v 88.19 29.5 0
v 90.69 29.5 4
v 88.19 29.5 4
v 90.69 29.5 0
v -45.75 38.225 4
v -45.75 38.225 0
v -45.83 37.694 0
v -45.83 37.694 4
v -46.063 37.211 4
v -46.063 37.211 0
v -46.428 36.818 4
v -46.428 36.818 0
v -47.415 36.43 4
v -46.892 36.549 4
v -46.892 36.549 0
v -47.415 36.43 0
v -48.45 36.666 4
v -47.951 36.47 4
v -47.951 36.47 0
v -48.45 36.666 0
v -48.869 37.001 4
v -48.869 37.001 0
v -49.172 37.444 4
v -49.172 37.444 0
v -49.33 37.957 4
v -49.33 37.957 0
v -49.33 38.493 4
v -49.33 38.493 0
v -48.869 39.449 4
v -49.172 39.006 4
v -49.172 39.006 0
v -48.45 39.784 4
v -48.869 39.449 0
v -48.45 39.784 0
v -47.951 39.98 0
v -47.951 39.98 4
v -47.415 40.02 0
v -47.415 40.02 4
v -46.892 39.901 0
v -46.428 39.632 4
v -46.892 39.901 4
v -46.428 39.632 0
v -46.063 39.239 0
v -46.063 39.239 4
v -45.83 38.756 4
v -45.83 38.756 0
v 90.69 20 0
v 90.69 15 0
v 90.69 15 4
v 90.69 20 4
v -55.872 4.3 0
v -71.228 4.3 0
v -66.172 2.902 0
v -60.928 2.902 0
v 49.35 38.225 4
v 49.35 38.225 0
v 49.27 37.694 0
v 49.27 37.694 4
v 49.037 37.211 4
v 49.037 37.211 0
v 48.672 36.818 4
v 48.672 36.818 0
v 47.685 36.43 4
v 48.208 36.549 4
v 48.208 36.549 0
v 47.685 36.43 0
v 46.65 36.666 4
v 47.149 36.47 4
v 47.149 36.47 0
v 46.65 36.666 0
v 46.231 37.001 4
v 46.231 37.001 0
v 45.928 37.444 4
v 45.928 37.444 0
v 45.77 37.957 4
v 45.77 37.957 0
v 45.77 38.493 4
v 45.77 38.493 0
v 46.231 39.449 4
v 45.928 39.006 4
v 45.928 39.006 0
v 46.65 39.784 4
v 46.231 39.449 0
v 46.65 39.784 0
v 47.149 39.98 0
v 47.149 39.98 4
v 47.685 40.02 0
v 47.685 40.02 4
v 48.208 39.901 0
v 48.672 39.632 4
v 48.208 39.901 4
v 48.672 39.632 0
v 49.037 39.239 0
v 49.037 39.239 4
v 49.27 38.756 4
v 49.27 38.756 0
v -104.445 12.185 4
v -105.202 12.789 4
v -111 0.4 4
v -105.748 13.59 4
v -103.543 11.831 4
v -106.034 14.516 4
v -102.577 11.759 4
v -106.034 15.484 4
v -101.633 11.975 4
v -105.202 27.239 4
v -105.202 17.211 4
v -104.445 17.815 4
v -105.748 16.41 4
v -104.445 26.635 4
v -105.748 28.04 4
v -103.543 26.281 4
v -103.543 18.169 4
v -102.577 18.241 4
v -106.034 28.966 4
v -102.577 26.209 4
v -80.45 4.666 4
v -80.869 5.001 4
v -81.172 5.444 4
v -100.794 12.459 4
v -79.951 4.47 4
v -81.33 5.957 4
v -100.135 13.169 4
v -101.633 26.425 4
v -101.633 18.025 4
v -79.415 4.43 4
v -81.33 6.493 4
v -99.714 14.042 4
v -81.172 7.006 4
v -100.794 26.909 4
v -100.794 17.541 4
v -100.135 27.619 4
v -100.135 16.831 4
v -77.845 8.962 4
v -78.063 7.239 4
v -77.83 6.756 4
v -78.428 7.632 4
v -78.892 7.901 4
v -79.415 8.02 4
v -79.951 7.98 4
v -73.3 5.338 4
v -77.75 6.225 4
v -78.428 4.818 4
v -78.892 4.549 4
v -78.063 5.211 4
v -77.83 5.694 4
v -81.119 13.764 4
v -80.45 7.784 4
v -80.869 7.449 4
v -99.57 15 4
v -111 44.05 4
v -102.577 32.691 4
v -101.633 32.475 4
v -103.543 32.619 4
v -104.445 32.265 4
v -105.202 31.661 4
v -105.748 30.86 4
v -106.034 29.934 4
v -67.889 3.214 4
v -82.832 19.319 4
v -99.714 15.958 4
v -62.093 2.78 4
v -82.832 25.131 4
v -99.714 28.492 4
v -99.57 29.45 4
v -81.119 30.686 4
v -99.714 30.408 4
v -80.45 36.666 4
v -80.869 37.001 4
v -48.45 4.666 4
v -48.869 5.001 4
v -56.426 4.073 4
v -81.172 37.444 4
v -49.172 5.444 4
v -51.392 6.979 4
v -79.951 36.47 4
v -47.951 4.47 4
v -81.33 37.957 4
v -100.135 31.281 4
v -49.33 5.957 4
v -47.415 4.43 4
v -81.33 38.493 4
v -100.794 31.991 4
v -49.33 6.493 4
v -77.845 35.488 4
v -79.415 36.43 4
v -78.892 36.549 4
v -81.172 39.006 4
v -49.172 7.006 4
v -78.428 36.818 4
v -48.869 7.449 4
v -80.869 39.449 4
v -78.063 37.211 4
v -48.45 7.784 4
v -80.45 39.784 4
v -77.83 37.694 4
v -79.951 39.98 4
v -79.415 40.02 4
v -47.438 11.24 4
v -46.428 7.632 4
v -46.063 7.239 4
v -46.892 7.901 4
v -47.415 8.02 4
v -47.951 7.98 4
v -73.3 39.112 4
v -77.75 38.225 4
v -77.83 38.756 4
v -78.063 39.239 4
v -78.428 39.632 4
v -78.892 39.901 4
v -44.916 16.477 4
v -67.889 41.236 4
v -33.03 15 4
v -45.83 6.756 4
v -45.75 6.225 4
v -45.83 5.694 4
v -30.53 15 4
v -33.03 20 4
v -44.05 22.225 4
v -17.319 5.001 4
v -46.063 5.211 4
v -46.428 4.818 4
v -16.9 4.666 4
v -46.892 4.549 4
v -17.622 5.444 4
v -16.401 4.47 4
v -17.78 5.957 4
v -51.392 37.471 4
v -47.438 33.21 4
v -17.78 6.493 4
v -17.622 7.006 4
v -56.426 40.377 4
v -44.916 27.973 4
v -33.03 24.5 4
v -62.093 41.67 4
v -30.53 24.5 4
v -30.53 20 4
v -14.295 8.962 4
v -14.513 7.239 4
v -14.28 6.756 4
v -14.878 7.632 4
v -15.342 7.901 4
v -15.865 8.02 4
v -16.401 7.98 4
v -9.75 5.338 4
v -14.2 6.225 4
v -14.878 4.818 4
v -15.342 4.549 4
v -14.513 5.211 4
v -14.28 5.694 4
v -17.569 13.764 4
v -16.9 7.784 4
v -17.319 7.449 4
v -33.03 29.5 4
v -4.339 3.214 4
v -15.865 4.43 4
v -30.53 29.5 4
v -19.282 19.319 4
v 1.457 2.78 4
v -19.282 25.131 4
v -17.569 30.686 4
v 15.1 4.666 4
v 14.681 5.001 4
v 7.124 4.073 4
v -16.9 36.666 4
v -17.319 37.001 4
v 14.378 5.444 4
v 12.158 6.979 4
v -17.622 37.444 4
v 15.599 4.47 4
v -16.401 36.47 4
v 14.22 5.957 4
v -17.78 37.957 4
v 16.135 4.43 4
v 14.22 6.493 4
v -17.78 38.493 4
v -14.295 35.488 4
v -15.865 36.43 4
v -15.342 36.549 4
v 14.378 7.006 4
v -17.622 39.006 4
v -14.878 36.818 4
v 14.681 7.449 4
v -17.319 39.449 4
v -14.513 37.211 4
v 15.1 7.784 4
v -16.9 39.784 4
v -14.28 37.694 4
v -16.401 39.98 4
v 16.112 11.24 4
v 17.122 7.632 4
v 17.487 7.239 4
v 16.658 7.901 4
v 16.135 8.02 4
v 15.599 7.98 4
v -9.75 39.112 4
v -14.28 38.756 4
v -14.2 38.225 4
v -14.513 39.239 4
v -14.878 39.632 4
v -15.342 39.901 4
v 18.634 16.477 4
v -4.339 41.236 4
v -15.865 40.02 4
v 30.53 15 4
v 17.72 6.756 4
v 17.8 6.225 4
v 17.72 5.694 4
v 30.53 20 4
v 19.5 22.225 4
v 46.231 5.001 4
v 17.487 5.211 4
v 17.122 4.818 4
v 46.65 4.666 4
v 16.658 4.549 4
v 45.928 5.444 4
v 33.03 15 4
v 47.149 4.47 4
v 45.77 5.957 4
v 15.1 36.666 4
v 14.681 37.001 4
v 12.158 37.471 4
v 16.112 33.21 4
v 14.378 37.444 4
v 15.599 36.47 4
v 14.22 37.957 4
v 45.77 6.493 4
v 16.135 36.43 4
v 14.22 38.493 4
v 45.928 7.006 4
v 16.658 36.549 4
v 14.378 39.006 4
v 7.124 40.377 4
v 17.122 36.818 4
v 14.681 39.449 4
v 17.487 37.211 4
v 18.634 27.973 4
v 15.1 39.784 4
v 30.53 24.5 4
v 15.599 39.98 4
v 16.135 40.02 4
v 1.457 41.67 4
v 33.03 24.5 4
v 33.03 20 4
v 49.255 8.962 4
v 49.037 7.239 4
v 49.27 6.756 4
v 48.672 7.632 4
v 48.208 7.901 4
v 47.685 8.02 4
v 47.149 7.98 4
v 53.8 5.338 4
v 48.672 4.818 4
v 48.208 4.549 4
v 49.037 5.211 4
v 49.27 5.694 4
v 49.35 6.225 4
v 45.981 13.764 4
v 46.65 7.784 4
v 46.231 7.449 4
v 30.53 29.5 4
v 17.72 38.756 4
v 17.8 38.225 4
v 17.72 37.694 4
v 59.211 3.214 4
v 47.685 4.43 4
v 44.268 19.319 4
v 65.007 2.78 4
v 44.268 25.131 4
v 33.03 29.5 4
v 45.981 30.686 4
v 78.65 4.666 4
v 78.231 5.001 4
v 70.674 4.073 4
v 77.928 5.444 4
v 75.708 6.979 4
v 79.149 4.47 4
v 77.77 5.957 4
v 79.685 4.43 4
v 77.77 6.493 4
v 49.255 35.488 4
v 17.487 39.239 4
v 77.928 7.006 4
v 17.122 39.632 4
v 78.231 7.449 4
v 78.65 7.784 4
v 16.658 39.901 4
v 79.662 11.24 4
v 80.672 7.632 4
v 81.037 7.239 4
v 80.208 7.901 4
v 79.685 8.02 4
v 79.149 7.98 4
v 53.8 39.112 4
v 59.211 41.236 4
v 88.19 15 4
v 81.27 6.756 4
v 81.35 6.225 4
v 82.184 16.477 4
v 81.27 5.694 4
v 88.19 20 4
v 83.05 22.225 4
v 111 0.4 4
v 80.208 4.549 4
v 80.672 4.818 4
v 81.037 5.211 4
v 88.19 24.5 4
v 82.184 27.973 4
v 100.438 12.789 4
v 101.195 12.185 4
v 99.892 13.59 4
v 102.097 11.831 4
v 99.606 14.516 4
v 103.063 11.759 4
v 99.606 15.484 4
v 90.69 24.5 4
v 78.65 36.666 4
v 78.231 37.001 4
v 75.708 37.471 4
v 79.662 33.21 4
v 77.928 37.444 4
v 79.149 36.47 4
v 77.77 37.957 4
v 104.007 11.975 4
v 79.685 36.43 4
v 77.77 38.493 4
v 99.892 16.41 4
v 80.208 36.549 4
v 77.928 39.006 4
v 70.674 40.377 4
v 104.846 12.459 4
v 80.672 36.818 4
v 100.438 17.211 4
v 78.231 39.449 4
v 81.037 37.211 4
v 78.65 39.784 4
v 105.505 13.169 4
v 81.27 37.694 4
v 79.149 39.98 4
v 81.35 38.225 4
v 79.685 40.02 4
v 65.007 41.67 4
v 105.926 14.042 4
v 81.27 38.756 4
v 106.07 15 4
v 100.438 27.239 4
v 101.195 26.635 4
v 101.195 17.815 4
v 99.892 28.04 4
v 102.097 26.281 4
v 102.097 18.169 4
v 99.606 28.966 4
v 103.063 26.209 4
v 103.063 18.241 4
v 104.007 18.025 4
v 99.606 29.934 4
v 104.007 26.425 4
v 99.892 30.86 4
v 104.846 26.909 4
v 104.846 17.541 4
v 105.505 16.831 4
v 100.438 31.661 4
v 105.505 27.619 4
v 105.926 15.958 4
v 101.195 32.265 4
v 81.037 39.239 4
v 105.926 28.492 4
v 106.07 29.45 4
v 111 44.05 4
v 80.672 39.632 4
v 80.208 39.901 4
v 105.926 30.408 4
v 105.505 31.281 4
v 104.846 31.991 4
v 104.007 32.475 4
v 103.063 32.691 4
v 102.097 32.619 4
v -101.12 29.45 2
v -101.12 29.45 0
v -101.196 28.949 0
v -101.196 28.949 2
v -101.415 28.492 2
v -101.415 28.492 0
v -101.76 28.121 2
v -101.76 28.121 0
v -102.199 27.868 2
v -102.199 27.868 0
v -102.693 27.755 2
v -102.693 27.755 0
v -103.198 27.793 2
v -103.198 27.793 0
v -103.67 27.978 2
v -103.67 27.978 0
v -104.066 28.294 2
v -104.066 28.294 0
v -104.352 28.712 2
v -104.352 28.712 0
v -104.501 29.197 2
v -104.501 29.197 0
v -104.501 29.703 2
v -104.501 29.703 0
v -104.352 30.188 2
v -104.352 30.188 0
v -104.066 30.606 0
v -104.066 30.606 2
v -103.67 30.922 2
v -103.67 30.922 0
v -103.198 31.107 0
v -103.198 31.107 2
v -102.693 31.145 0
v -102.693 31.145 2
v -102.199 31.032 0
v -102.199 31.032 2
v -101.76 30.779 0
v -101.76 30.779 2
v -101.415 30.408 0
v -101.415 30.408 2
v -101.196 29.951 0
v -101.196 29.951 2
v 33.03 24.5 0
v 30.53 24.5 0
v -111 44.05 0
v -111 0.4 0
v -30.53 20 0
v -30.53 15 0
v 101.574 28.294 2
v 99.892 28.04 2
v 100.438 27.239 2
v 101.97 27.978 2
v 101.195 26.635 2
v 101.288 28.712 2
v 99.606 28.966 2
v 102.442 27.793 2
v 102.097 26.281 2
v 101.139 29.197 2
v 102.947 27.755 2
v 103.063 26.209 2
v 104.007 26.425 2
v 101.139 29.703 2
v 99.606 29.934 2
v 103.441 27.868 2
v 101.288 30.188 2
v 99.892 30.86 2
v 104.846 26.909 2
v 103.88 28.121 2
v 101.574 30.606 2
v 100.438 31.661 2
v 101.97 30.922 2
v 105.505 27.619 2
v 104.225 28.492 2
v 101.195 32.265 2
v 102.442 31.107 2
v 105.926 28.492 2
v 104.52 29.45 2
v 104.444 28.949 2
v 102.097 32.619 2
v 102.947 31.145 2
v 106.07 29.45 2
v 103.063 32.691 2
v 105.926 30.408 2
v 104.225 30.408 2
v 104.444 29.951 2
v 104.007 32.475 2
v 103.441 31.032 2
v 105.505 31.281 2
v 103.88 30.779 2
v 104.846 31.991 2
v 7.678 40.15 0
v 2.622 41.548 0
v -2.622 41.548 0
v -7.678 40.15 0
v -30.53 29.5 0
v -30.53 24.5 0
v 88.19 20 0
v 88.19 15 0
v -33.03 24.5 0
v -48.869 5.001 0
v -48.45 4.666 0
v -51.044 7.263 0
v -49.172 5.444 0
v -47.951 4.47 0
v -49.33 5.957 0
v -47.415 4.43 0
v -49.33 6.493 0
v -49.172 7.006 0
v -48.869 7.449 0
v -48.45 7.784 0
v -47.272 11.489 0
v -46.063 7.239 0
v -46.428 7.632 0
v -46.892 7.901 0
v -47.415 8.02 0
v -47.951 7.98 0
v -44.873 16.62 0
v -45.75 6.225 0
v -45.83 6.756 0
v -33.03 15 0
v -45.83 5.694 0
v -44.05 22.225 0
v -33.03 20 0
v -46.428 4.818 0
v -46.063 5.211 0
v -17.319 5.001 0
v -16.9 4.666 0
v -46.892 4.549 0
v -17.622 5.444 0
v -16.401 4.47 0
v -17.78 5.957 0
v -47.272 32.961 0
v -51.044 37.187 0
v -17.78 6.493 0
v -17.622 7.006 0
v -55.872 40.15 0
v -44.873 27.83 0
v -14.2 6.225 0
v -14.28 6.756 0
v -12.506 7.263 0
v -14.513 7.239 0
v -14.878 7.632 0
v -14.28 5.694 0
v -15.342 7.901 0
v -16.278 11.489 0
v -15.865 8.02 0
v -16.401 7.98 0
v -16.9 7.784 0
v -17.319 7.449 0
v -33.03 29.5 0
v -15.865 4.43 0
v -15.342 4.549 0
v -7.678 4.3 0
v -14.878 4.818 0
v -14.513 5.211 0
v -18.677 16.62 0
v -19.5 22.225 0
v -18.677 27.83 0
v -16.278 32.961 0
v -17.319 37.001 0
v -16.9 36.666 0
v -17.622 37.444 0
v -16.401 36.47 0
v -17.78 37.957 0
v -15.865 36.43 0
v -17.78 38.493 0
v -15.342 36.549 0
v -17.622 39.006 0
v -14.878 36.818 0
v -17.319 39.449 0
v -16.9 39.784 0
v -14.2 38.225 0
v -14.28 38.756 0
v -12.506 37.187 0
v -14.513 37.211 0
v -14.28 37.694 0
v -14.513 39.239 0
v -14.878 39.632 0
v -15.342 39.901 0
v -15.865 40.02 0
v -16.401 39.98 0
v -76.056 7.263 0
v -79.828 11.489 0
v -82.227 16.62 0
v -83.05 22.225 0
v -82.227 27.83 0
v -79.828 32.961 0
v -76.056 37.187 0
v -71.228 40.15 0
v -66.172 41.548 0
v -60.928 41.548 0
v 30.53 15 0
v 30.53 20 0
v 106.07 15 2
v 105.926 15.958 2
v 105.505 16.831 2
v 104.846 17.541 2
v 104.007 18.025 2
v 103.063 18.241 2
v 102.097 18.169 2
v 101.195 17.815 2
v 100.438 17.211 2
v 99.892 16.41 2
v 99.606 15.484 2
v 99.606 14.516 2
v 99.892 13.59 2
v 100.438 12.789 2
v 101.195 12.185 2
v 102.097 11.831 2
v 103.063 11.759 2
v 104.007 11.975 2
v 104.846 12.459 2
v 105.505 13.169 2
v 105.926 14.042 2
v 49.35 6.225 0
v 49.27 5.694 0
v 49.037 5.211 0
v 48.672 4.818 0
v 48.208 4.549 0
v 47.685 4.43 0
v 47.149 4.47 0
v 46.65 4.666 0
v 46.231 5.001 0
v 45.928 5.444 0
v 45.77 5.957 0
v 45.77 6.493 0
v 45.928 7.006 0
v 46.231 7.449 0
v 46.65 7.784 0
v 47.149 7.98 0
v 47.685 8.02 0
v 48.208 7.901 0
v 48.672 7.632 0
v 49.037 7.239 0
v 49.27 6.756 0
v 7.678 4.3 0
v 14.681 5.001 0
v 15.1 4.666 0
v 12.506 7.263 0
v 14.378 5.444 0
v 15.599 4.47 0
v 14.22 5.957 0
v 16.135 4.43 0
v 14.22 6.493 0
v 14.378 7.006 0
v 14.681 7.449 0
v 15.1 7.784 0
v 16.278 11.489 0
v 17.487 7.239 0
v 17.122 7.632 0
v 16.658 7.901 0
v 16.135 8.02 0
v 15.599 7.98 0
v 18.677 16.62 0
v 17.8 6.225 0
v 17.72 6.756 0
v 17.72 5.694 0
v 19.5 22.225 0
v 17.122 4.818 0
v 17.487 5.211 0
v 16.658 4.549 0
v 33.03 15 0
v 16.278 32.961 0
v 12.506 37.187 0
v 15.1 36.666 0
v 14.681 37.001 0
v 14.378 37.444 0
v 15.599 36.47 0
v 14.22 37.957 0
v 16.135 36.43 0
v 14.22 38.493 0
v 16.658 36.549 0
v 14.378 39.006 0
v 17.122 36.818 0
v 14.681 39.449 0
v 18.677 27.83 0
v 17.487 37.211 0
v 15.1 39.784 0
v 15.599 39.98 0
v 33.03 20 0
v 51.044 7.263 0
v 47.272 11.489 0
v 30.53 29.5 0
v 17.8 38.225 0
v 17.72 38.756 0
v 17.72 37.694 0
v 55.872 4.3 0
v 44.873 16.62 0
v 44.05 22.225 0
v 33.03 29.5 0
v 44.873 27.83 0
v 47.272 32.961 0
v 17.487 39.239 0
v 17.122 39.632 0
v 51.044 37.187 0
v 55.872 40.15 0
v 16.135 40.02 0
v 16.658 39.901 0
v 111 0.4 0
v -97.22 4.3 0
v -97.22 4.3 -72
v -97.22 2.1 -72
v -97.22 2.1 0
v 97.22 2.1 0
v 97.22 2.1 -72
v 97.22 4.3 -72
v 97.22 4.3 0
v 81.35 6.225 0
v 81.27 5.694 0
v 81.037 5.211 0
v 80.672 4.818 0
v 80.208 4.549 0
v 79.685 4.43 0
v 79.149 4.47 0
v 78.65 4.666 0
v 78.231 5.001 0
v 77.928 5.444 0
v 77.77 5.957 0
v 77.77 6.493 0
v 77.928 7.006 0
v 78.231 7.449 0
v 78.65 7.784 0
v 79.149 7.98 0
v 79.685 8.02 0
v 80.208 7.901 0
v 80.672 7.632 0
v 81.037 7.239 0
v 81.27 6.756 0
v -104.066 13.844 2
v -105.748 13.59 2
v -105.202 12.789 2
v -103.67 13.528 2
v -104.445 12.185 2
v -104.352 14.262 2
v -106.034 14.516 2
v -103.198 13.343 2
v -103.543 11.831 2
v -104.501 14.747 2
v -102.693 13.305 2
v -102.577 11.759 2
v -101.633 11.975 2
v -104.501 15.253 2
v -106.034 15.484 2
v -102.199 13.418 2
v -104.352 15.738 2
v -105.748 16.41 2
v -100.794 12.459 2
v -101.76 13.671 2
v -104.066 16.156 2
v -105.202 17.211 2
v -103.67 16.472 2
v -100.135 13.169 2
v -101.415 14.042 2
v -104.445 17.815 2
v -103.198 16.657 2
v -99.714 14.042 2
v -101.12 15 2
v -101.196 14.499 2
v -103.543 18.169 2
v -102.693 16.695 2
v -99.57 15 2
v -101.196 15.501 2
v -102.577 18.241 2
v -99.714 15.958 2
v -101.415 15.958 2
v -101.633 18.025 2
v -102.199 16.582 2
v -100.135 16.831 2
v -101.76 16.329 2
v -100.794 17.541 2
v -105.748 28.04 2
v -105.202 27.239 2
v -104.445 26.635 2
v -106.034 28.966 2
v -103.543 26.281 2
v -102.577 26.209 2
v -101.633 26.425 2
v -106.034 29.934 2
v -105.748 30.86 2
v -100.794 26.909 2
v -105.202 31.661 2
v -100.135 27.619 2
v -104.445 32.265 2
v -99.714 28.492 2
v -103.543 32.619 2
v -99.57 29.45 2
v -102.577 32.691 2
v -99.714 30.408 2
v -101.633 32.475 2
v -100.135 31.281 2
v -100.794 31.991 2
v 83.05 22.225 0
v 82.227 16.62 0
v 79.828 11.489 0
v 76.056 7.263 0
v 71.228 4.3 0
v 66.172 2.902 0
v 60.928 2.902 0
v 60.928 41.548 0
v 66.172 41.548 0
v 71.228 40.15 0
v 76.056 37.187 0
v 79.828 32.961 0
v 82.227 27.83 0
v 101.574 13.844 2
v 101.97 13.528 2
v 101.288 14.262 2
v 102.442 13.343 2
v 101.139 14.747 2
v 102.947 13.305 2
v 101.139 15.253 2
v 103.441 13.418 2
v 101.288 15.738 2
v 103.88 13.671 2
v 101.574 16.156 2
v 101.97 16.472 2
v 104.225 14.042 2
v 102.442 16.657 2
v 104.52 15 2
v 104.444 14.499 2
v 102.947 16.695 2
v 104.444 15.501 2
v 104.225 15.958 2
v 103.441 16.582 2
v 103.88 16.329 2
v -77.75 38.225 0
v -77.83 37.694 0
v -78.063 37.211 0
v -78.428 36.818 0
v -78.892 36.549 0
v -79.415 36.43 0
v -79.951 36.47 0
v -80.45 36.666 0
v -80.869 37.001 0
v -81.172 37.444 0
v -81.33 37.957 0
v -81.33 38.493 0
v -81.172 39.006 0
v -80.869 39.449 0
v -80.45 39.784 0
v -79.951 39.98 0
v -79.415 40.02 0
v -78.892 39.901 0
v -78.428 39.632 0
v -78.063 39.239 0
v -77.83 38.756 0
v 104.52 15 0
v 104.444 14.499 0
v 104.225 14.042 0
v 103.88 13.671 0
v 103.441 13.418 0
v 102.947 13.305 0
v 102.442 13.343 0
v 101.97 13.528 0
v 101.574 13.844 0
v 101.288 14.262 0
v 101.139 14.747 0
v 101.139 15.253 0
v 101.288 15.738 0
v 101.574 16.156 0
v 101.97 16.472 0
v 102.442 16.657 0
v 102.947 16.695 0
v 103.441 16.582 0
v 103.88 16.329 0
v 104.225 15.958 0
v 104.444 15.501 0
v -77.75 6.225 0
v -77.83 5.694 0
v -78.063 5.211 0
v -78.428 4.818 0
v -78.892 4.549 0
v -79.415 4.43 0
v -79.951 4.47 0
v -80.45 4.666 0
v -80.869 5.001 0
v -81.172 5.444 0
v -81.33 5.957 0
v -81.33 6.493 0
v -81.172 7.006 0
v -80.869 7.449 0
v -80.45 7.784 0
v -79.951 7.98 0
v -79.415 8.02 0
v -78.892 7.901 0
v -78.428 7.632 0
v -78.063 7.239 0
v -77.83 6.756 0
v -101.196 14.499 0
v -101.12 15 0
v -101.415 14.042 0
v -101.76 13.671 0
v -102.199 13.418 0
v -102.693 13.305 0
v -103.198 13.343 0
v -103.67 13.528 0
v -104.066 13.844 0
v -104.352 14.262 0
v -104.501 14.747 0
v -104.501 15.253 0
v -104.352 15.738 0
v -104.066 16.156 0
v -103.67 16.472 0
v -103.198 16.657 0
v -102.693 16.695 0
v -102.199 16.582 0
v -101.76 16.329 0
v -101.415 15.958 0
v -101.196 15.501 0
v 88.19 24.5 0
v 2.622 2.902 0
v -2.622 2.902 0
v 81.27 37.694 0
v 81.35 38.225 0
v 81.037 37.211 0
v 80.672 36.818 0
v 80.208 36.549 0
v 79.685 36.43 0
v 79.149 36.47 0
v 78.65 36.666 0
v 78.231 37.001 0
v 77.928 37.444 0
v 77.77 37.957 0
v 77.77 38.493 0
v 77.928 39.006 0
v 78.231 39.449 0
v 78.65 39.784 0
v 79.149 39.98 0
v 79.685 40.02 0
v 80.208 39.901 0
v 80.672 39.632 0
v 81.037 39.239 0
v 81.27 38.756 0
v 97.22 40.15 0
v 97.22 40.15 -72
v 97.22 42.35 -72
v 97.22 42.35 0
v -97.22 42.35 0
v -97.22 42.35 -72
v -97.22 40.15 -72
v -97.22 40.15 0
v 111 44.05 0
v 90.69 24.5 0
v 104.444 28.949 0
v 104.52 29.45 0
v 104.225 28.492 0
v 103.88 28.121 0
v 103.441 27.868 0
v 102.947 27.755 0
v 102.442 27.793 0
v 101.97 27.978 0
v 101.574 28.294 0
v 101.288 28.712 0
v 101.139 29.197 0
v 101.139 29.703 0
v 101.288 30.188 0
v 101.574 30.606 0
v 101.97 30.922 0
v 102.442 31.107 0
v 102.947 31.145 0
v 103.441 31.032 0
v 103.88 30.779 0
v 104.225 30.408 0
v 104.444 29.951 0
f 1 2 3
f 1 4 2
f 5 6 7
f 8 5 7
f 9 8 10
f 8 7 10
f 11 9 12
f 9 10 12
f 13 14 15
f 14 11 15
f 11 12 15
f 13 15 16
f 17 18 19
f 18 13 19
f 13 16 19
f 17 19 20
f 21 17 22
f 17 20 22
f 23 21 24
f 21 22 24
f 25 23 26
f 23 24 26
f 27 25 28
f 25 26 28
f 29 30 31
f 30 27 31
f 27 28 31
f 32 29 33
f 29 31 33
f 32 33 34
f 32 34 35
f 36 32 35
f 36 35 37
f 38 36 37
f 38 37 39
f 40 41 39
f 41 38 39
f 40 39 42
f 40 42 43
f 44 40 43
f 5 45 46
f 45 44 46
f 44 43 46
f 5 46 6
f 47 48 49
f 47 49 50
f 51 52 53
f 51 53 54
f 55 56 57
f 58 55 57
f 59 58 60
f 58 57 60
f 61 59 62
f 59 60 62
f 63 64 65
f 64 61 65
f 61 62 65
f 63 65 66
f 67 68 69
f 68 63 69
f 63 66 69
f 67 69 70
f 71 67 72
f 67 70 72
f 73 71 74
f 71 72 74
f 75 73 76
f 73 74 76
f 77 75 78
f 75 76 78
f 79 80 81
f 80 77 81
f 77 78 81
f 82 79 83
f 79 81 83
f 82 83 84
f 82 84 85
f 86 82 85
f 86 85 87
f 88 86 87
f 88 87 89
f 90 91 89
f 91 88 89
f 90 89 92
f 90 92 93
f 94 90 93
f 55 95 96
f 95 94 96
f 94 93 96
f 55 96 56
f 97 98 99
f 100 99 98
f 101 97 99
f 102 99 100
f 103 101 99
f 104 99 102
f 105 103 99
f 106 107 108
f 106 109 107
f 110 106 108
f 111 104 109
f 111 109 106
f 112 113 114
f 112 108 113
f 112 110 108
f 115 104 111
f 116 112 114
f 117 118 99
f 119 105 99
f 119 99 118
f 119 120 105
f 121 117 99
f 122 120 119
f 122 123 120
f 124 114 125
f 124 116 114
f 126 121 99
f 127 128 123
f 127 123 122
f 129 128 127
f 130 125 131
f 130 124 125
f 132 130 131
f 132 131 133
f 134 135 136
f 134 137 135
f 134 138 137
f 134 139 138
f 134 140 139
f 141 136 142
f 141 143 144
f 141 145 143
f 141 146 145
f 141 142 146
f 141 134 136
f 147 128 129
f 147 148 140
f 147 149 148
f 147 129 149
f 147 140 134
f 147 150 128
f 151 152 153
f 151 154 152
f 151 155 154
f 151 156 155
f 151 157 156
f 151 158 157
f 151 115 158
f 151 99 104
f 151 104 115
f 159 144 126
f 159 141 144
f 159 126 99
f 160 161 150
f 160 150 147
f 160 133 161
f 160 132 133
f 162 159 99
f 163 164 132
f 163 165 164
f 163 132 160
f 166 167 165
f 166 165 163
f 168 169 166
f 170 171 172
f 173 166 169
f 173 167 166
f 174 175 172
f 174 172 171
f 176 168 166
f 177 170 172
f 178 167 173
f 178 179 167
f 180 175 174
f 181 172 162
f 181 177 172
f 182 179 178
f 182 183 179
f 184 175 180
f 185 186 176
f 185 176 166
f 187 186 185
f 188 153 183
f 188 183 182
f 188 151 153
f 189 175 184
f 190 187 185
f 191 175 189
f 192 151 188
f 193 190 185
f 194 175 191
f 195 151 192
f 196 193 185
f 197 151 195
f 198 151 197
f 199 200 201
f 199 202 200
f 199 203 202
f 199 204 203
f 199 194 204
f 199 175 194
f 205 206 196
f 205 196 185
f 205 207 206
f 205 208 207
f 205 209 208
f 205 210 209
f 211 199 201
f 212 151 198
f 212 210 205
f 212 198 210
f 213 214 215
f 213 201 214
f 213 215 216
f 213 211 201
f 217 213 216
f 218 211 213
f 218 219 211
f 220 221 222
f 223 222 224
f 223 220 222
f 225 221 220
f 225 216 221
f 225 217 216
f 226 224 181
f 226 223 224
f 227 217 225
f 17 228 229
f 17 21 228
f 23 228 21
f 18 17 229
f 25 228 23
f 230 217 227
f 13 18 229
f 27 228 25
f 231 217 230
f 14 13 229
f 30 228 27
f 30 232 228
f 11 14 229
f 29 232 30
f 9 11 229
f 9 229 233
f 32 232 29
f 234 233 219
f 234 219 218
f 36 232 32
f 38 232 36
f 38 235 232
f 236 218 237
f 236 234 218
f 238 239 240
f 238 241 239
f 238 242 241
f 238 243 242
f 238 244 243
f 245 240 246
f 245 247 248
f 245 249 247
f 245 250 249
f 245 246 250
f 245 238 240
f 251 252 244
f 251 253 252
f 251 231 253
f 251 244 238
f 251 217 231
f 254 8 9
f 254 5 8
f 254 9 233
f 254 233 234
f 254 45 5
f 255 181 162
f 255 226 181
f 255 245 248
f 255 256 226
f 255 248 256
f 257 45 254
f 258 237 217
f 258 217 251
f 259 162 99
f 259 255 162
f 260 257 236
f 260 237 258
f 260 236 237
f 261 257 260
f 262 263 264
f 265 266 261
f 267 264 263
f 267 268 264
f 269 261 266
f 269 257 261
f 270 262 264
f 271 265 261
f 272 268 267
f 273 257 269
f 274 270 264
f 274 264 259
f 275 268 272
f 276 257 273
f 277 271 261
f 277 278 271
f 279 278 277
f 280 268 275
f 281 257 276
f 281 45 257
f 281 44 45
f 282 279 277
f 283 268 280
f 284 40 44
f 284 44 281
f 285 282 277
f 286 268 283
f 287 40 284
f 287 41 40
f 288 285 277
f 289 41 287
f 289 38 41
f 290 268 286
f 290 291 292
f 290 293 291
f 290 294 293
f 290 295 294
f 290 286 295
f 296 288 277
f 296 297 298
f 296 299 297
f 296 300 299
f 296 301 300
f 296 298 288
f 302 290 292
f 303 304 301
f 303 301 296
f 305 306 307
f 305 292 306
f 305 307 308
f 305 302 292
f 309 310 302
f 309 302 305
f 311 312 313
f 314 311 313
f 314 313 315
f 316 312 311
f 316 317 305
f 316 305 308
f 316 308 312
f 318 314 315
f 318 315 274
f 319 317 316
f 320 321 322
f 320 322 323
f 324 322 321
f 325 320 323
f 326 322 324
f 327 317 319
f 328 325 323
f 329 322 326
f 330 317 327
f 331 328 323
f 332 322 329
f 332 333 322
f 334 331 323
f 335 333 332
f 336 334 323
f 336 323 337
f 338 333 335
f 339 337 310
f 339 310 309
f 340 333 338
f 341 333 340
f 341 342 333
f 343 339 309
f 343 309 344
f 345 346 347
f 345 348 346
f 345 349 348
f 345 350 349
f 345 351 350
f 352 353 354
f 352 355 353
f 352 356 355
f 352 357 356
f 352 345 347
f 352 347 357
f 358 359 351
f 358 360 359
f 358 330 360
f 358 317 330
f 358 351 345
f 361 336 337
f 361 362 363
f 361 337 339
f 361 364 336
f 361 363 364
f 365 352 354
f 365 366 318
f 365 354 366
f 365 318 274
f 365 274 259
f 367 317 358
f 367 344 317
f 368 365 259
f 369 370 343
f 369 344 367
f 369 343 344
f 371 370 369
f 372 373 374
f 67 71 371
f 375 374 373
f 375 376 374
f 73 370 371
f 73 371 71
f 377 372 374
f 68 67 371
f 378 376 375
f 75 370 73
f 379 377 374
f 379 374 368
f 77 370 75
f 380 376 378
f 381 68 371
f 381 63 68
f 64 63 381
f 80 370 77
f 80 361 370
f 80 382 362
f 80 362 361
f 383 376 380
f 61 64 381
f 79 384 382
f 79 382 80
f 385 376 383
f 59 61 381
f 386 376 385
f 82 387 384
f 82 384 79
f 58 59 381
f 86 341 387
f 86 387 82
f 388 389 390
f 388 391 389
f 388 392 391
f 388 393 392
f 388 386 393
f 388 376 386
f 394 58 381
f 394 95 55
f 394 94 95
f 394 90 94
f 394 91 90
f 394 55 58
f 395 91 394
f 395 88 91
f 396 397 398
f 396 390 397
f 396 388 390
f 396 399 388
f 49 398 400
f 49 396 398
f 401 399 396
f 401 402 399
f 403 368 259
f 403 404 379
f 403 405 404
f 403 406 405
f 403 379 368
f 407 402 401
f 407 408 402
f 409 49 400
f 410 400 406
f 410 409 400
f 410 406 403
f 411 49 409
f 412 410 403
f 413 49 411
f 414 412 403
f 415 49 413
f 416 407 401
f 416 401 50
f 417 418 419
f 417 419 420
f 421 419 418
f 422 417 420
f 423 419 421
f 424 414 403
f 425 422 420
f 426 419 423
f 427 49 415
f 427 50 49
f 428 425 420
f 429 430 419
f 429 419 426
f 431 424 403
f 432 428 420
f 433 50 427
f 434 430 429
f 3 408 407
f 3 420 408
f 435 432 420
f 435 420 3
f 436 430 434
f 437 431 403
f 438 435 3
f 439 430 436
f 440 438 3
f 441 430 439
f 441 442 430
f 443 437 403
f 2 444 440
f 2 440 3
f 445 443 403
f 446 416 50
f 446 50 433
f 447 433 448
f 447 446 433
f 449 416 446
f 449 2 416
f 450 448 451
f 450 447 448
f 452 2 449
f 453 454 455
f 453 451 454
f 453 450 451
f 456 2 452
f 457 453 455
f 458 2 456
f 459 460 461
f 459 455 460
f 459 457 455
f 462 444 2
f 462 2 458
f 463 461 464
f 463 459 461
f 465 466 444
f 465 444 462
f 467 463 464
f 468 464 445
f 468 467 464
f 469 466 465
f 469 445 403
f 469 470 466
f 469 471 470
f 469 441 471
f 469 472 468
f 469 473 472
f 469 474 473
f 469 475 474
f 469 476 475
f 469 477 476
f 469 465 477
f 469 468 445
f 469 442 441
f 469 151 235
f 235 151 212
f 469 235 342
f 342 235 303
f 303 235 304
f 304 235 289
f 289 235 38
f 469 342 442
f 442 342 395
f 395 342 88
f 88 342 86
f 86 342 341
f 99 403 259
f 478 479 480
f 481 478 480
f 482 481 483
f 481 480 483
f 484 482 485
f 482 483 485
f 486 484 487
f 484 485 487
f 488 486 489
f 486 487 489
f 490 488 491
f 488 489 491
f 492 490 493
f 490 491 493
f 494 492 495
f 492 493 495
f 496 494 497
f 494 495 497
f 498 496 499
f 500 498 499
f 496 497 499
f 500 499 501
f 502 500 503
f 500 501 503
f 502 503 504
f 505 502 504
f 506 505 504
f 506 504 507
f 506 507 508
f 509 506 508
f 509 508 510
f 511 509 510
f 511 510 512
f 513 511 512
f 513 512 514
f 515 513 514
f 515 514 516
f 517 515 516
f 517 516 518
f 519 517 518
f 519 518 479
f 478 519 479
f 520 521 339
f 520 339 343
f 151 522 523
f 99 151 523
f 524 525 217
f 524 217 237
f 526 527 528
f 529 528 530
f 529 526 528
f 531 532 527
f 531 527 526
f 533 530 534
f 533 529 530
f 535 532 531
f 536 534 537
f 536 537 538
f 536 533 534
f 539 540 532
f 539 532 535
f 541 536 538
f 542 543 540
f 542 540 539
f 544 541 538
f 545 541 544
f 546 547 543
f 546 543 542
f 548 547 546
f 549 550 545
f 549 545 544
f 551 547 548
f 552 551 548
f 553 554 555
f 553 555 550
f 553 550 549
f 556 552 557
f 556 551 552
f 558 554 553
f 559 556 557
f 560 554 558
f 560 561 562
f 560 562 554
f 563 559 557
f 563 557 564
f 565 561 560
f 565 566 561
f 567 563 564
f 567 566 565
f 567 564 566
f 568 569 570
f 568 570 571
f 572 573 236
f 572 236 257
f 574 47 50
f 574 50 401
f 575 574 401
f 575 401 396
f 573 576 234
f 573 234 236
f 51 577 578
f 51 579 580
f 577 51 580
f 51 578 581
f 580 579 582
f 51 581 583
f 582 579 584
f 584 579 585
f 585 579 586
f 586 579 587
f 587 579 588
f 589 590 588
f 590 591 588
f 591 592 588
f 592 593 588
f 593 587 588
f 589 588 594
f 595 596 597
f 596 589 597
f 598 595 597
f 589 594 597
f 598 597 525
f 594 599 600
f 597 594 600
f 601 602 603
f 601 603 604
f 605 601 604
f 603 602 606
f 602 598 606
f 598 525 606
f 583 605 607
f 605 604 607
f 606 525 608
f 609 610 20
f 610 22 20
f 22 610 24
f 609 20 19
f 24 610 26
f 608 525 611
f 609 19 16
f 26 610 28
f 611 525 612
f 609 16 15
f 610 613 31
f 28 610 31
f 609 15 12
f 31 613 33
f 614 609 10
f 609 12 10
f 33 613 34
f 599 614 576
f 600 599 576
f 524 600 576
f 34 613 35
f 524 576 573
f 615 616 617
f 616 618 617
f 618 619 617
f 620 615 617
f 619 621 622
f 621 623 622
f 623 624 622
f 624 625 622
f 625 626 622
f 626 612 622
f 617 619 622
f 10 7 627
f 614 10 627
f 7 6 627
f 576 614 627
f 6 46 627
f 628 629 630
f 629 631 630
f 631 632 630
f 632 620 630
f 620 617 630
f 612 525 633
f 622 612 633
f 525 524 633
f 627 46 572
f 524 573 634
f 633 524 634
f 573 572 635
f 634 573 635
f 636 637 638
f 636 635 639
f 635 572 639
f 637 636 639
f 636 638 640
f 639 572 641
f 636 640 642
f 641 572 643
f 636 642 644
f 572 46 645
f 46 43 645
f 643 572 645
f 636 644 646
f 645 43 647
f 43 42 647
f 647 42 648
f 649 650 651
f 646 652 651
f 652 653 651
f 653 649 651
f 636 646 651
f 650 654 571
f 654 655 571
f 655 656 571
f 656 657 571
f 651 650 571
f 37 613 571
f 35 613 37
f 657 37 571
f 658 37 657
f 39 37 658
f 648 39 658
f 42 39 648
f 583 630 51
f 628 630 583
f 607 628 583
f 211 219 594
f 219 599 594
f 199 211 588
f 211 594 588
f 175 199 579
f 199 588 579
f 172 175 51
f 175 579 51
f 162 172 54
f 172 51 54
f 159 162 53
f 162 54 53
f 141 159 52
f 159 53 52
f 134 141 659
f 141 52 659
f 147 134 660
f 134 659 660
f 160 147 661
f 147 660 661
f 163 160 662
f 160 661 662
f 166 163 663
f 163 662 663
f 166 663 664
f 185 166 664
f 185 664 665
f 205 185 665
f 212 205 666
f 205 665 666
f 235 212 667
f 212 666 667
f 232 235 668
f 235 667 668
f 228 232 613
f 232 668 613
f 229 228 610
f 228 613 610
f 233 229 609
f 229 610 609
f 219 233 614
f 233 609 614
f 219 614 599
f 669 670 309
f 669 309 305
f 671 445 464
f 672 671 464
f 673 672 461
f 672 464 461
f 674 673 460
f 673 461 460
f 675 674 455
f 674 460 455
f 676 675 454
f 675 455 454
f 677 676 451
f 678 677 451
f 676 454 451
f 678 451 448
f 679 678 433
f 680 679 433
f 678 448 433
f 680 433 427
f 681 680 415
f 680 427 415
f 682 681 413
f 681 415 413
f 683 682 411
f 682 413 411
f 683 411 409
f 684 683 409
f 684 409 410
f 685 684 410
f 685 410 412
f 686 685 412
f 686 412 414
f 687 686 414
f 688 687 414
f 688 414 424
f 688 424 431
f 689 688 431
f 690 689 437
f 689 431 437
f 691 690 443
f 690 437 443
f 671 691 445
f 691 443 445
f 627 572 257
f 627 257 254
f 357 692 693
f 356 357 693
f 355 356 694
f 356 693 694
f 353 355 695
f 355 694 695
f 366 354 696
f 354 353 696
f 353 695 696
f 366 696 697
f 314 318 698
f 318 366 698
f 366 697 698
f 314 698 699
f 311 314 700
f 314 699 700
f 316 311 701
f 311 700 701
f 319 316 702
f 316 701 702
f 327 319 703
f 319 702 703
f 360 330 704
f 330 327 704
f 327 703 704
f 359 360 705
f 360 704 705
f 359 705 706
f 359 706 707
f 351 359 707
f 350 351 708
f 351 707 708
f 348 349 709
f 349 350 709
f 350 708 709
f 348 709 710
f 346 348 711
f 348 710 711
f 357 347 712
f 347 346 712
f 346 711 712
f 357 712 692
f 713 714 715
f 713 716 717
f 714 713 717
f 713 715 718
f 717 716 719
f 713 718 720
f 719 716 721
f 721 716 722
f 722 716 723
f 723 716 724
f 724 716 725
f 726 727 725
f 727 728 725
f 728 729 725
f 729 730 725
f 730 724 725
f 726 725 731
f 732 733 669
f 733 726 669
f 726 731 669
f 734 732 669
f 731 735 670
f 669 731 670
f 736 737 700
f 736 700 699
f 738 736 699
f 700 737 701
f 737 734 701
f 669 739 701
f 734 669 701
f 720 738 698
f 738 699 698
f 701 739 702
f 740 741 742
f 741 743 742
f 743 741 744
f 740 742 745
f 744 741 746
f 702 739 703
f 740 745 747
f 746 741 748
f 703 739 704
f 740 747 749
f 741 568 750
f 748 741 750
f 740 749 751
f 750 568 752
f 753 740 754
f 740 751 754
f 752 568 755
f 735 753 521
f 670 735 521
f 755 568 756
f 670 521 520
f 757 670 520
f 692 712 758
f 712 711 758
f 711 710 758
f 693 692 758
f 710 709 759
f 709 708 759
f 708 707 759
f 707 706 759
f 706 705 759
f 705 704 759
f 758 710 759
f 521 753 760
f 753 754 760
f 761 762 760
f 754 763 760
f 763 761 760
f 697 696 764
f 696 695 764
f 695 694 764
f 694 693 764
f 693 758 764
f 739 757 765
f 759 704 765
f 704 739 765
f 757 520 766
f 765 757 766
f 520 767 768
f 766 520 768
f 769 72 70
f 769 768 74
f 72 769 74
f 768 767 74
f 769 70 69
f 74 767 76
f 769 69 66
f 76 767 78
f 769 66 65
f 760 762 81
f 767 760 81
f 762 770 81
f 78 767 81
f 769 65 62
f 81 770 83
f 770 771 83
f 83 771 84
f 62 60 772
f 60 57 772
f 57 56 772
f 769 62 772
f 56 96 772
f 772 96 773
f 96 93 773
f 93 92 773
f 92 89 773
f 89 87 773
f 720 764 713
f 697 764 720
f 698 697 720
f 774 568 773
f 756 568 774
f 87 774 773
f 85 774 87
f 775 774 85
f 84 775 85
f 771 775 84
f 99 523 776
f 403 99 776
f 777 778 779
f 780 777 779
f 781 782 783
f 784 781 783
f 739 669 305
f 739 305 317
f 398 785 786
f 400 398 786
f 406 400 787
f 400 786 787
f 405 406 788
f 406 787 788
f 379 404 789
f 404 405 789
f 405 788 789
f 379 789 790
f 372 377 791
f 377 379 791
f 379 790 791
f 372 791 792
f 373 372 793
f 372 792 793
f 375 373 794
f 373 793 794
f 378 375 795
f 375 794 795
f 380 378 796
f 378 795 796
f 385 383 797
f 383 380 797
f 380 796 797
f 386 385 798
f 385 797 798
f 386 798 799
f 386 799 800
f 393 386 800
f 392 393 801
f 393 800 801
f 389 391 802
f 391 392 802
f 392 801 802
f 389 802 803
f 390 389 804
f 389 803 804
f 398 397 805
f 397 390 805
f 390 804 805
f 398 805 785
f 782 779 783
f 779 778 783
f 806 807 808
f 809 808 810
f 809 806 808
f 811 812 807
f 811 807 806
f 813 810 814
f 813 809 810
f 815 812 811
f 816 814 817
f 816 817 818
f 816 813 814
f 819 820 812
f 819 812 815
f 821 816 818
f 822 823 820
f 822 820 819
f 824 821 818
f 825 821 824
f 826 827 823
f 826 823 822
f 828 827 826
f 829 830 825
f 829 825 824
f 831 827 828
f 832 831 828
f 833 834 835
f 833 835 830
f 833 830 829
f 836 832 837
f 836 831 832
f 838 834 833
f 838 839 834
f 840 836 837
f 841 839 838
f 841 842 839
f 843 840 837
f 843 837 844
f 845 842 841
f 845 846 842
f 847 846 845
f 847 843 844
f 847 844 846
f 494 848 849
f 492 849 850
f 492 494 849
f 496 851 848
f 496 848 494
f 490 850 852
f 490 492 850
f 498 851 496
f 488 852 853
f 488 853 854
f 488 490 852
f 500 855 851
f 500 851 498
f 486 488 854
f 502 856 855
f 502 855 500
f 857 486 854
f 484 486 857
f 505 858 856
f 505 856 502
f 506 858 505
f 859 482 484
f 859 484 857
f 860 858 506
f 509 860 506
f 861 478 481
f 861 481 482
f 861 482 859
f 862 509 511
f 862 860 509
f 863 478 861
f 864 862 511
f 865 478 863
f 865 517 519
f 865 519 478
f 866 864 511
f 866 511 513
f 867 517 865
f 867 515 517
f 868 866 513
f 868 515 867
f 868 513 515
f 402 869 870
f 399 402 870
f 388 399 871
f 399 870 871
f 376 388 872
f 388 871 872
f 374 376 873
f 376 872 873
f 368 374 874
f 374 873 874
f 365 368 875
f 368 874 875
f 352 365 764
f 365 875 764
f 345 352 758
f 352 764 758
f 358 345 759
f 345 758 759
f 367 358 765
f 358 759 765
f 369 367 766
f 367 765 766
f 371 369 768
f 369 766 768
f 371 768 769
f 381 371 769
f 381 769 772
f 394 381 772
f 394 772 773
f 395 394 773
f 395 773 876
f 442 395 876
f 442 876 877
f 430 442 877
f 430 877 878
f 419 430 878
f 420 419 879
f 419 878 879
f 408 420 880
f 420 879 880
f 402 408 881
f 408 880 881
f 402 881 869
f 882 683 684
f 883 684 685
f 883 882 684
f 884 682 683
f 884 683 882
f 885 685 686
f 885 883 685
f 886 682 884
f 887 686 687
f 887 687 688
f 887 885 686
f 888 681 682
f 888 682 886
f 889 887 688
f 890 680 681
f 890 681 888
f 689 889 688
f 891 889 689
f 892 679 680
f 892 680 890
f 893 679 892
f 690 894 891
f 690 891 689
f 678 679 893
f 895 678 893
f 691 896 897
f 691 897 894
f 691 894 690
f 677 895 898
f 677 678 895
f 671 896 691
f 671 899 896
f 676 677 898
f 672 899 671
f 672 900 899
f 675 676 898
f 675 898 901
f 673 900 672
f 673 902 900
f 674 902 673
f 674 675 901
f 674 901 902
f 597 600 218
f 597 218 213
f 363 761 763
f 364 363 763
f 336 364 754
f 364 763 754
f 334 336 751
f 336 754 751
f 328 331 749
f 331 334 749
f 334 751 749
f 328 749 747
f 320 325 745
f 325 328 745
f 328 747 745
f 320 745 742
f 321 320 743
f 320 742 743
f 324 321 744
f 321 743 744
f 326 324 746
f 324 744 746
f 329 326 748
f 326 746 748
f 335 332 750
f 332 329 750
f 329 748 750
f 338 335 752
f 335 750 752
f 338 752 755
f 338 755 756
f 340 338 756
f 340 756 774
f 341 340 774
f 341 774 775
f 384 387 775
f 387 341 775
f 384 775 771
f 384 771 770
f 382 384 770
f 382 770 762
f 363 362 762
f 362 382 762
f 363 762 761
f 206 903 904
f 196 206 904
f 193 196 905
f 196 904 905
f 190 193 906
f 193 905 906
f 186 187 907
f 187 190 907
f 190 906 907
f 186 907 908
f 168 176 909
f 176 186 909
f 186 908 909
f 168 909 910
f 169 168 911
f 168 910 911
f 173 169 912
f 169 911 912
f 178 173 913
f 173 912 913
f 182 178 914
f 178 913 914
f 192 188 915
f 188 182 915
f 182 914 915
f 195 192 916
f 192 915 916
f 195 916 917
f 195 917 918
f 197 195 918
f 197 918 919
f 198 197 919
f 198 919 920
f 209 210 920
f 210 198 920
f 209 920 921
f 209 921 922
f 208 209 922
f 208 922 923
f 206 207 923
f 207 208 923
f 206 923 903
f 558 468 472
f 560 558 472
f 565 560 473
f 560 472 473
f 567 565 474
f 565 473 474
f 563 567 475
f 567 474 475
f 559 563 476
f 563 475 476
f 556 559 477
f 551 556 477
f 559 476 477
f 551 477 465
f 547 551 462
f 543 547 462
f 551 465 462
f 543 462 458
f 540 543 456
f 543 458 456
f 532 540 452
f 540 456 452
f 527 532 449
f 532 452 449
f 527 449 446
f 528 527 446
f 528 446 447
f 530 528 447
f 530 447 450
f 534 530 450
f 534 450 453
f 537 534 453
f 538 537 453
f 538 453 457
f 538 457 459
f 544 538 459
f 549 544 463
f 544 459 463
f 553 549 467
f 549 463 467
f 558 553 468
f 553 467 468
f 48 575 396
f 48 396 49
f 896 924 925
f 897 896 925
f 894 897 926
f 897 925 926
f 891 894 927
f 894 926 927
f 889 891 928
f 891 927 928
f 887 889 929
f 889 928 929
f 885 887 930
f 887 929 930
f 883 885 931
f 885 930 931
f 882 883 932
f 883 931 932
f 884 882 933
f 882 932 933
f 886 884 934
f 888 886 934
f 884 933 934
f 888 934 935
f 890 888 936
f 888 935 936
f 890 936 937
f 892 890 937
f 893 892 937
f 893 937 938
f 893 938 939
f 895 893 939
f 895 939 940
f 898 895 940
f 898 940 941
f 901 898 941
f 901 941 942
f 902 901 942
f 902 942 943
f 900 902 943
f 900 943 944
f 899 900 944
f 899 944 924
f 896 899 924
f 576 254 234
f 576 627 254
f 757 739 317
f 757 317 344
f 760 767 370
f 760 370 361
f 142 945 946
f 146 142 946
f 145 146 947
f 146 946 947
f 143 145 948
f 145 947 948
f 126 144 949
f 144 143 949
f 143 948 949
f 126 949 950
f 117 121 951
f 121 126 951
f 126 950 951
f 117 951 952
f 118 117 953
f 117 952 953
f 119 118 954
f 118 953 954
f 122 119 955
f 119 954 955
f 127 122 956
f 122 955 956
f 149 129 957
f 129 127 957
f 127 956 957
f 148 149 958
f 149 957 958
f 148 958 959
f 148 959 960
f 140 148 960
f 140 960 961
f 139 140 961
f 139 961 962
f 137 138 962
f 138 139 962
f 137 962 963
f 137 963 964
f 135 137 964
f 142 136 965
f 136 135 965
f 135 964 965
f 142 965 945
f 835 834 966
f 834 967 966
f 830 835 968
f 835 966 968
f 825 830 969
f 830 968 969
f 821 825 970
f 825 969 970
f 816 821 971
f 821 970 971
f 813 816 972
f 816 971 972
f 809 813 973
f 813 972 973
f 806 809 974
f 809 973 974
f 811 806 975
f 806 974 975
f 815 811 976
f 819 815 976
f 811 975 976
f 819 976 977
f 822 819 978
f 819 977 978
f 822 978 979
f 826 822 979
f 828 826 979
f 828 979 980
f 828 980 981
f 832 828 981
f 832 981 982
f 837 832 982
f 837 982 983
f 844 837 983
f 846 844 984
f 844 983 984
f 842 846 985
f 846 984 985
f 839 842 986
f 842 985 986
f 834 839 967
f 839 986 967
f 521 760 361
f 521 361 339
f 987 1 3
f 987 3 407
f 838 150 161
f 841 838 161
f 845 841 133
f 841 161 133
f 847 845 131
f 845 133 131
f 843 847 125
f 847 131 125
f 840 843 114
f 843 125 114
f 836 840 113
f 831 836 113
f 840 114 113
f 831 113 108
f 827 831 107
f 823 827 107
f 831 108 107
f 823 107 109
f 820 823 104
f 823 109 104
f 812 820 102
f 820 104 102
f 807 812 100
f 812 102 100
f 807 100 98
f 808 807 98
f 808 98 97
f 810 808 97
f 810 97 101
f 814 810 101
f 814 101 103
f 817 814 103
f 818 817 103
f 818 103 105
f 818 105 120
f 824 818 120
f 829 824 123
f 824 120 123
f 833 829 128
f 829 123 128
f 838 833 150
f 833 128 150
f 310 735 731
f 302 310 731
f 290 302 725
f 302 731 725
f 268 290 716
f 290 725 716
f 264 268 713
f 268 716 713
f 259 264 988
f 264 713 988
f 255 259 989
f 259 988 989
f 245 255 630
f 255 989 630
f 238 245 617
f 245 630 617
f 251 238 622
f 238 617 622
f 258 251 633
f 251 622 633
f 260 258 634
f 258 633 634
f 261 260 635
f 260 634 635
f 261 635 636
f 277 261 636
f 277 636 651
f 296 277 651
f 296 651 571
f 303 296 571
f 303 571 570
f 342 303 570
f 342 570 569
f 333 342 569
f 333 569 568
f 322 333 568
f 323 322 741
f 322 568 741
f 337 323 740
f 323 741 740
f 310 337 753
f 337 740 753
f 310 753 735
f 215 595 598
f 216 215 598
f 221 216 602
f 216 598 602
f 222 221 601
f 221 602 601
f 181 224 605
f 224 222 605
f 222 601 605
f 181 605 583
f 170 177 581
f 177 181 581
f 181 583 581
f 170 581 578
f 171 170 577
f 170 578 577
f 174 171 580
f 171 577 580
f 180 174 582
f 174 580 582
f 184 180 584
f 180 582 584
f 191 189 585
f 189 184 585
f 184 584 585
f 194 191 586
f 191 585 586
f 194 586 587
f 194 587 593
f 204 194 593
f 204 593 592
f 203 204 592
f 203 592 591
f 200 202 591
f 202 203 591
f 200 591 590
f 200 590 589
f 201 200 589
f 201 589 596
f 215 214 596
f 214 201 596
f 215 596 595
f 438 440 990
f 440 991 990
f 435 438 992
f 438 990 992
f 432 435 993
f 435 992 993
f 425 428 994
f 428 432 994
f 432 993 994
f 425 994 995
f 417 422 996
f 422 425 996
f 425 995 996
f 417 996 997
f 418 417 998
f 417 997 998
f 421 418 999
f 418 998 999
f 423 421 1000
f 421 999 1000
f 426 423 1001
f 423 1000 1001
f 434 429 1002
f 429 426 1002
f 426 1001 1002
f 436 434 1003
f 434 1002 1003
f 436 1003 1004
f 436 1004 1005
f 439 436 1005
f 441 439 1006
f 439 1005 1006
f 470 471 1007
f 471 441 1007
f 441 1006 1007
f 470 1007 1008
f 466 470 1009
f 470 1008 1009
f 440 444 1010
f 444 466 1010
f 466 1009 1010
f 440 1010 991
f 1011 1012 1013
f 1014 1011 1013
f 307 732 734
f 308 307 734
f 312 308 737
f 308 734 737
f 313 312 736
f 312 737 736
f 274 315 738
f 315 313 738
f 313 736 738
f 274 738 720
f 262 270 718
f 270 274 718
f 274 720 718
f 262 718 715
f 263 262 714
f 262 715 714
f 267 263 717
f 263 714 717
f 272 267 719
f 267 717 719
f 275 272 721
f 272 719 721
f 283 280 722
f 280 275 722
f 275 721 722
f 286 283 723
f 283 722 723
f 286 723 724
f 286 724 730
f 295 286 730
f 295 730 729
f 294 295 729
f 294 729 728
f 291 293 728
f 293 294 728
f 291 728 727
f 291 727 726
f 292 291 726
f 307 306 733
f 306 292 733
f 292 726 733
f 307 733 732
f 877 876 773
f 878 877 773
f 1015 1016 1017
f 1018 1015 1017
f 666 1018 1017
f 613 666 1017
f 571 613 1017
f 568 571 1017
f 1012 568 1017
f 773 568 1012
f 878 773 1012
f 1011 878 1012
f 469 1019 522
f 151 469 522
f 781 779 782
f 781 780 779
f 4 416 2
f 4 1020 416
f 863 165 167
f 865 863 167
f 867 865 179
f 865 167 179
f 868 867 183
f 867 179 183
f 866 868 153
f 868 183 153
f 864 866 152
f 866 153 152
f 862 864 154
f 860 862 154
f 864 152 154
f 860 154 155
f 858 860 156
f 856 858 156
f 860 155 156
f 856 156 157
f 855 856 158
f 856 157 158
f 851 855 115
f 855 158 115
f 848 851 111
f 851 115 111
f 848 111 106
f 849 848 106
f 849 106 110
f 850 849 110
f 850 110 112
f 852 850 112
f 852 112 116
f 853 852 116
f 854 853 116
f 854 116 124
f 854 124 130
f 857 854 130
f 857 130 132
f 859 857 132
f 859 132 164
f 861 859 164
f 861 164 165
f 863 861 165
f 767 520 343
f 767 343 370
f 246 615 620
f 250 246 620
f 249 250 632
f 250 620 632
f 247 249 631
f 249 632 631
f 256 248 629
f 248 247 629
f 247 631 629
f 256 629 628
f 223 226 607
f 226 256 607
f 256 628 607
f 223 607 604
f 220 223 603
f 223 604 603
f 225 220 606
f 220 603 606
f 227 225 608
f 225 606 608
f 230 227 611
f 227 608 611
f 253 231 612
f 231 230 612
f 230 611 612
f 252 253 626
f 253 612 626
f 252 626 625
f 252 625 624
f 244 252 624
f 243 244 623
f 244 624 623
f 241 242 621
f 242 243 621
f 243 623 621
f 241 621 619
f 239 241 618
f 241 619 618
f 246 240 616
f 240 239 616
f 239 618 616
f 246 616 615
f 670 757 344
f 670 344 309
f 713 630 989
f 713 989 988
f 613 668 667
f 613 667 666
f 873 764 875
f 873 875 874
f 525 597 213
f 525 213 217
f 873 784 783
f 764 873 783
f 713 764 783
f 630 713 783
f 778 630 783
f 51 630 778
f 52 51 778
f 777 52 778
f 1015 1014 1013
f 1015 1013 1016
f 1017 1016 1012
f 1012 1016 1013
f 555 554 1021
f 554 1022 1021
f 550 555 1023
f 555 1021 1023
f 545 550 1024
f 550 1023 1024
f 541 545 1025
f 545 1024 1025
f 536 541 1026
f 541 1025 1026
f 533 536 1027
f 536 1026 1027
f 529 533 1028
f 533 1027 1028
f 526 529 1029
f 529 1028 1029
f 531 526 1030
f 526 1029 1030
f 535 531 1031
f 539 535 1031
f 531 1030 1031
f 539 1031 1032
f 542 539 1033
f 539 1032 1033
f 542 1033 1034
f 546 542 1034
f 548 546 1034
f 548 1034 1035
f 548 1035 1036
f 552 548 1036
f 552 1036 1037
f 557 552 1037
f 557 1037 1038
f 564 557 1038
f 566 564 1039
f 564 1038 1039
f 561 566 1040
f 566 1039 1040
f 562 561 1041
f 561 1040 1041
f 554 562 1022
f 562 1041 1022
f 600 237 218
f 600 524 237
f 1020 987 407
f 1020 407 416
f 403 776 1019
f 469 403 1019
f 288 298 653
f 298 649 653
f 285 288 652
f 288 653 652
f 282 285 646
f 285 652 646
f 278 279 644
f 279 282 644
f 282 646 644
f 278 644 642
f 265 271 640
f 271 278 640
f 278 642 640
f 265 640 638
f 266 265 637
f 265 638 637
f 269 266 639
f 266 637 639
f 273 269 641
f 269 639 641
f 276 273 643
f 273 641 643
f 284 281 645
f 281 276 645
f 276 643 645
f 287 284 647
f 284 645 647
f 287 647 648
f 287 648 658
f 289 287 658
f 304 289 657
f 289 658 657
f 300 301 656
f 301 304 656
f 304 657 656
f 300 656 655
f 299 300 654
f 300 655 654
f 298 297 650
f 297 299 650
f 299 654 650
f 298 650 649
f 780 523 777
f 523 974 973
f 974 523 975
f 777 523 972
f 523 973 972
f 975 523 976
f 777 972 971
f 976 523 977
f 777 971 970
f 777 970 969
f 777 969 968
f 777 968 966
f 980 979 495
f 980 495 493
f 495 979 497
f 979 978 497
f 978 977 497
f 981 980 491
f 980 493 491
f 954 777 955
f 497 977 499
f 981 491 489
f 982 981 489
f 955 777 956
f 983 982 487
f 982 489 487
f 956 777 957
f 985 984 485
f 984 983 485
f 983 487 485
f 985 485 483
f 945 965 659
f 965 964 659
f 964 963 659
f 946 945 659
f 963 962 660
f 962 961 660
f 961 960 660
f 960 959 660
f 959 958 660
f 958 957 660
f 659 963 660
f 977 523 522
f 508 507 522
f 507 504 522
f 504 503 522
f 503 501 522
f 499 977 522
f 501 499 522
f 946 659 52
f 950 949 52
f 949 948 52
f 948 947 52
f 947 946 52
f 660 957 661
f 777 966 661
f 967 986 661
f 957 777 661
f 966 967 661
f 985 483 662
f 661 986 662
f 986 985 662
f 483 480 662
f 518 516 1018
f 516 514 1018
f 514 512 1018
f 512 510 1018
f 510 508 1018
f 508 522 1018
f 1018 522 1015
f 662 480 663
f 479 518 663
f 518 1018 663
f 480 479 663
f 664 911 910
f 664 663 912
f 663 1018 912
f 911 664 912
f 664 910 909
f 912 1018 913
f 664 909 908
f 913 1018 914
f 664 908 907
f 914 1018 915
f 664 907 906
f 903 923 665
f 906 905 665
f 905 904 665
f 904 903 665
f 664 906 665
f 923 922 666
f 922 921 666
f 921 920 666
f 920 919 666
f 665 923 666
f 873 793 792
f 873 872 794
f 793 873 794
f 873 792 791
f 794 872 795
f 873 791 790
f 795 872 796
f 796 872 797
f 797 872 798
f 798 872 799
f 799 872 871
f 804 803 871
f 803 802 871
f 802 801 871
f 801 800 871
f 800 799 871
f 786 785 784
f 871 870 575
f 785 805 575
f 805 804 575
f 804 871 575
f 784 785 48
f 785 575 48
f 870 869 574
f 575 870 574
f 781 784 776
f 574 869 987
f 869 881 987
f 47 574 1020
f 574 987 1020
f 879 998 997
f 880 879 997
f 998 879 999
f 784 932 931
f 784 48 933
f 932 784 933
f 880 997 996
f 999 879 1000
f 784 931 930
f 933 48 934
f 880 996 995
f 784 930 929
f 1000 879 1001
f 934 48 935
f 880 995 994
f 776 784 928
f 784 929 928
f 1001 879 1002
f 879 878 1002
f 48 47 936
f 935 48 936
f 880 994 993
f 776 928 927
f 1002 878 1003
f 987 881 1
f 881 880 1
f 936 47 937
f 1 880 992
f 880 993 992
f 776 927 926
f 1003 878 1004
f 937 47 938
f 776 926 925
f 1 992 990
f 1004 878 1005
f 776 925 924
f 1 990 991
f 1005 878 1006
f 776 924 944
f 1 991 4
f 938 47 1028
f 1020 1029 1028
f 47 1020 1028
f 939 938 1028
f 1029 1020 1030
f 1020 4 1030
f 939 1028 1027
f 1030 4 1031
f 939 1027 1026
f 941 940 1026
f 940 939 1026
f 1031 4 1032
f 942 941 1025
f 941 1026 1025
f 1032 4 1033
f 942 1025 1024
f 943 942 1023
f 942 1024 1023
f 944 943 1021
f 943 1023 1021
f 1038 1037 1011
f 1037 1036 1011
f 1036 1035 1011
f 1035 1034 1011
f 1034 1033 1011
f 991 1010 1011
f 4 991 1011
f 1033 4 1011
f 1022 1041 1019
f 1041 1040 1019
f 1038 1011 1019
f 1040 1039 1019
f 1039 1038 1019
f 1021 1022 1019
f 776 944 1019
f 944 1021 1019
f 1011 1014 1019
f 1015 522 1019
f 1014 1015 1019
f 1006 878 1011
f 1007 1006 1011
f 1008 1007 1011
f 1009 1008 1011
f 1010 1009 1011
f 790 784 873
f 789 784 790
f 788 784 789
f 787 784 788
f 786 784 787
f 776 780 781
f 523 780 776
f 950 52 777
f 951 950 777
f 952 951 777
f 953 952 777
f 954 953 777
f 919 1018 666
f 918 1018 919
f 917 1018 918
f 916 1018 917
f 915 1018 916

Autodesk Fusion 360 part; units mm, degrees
sketch "Plate" plane through (0, 0, 0) normal (0, 0, 1) x (1, 0, 0)
  line L0 (-111, 0.4) -> (111, 0.4)
  line L1 (111, 0.4) -> (111, 44.05)
  line L2 (111, 44.05) -> (-111, 44.05)
  line L3 (-111, 44.05) -> (-111, 0.4)
extrude "Plate (1)" add sketch "Plate" along normal blind 4
sketch "Duct walls" plane through (0, 0, 0) normal (0, 0, 1) x (1, 0, 0)
  line L0 (-97.22, 2.1) -> (97.22, 2.1)
  line L1 (97.22, 2.1) -> (97.22, 4.3)
  line L2 (97.22, 4.3) -> (-97.22, 4.3)
  line L3 (-97.22, 4.3) -> (-97.22, 2.1)
  line L4 (-97.22, 40.15) -> (97.22, 40.15)
  line L5 (97.22, 40.15) -> (97.22, 42.35)
  line L6 (97.22, 42.35) -> (-97.22, 42.35)
  line L7 (-97.22, 42.35) -> (-97.22, 40.15)
extrude "Duct walls (1)" add sketch "Duct walls" against normal blind 72
sketch "Openings and holes" plane through (0, 0, 0) normal (0, 0, 1) x (1, 0, 0)
  circle A0 centre (-63.55, 22.225) radius 19.5
  circle A1 centre (-79.55, 6.225) radius 1.8
  circle A2 centre (-79.55, 38.225) radius 1.8
  circle A3 centre (-47.55, 6.225) radius 1.8
  circle A4 centre (-47.55, 38.225) radius 1.8
  circle A5 centre (0, 22.225) radius 19.5
  circle A6 centre (-16, 6.225) radius 1.8
  circle A7 centre (-16, 38.225) radius 1.8
  circle A8 centre (16, 6.225) radius 1.8
  circle A9 centre (16, 38.225) radius 1.8
  circle A10 centre (63.55, 22.225) radius 19.5
  circle A11 centre (47.55, 6.225) radius 1.8
  circle A12 centre (47.55, 38.225) radius 1.8
  circle A13 centre (79.55, 6.225) radius 1.8
  circle A14 centre (79.55, 38.225) radius 1.8
  circle A15 centre (-102.82, 15) radius 1.7
  circle A16 centre (-102.82, 29.45) radius 1.7
  circle A17 centre (102.82, 15) radius 1.7
  circle A18 centre (102.82, 29.45) radius 1.7
extrude "Openings and holes (1)" cut sketch "Openings and holes" along normal blind 4
sketch "Tie slots" plane through (0, 0, 0) normal (0, 0, 1) x (1, 0, 0)
  line L0 (-33.03, 15) -> (-30.53, 15)
  line L1 (-30.53, 15) -> (-30.53, 20)
  line L2 (-30.53, 20) -> (-33.03, 20)
  line L3 (-33.03, 20) -> (-33.03, 15)
  line L4 (-33.03, 24.5) -> (-30.53, 24.5)
  line L5 (-30.53, 24.5) -> (-30.53, 29.5)
  line L6 (-30.53, 29.5) -> (-33.03, 29.5)
  line L7 (-33.03, 29.5) -> (-33.03, 24.5)
  line L8 (30.53, 15) -> (33.03, 15)
  line L9 (33.03, 15) -> (33.03, 20)
  line L10 (33.03, 20) -> (30.53, 20)
  line L11 (30.53, 20) -> (30.53, 15)
  line L12 (30.53, 24.5) -> (33.03, 24.5)
  line L13 (33.03, 24.5) -> (33.03, 29.5)
  line L14 (33.03, 29.5) -> (30.53, 29.5)
  line L15 (30.53, 29.5) -> (30.53, 24.5)
  line L16 (88.19, 15) -> (90.69, 15)
  line L17 (90.69, 15) -> (90.69, 20)
  line L18 (90.69, 20) -> (88.19, 20)
  line L19 (88.19, 20) -> (88.19, 15)
  line L20 (88.19, 24.5) -> (90.69, 24.5)
  line L21 (90.69, 24.5) -> (90.69, 29.5)
  line L22 (90.69, 29.5) -> (88.19, 29.5)
  line L23 (88.19, 29.5) -> (88.19, 24.5)
extrude "Tie slots (1)" cut sketch "Tie slots" along normal blind 4
ref_plane "WorkPlane1" through (0, 0, 4) normal (0, 0, 1) x (1, 0, 0)
sketch "Head counterbores" plane through (0, 0, 4) normal (0, 0, 1) x (1, 0, 0)
  circle A0 centre (-102.82, 15) radius 3.25
  circle A1 centre (-102.82, 29.45) radius 3.25
  circle A2 centre (102.82, 15) radius 3.25
  circle A3 centre (102.82, 29.45) radius 3.25
extrude "Head counterbores (1)" cut sketch "Head counterbores" against normal blind 2
